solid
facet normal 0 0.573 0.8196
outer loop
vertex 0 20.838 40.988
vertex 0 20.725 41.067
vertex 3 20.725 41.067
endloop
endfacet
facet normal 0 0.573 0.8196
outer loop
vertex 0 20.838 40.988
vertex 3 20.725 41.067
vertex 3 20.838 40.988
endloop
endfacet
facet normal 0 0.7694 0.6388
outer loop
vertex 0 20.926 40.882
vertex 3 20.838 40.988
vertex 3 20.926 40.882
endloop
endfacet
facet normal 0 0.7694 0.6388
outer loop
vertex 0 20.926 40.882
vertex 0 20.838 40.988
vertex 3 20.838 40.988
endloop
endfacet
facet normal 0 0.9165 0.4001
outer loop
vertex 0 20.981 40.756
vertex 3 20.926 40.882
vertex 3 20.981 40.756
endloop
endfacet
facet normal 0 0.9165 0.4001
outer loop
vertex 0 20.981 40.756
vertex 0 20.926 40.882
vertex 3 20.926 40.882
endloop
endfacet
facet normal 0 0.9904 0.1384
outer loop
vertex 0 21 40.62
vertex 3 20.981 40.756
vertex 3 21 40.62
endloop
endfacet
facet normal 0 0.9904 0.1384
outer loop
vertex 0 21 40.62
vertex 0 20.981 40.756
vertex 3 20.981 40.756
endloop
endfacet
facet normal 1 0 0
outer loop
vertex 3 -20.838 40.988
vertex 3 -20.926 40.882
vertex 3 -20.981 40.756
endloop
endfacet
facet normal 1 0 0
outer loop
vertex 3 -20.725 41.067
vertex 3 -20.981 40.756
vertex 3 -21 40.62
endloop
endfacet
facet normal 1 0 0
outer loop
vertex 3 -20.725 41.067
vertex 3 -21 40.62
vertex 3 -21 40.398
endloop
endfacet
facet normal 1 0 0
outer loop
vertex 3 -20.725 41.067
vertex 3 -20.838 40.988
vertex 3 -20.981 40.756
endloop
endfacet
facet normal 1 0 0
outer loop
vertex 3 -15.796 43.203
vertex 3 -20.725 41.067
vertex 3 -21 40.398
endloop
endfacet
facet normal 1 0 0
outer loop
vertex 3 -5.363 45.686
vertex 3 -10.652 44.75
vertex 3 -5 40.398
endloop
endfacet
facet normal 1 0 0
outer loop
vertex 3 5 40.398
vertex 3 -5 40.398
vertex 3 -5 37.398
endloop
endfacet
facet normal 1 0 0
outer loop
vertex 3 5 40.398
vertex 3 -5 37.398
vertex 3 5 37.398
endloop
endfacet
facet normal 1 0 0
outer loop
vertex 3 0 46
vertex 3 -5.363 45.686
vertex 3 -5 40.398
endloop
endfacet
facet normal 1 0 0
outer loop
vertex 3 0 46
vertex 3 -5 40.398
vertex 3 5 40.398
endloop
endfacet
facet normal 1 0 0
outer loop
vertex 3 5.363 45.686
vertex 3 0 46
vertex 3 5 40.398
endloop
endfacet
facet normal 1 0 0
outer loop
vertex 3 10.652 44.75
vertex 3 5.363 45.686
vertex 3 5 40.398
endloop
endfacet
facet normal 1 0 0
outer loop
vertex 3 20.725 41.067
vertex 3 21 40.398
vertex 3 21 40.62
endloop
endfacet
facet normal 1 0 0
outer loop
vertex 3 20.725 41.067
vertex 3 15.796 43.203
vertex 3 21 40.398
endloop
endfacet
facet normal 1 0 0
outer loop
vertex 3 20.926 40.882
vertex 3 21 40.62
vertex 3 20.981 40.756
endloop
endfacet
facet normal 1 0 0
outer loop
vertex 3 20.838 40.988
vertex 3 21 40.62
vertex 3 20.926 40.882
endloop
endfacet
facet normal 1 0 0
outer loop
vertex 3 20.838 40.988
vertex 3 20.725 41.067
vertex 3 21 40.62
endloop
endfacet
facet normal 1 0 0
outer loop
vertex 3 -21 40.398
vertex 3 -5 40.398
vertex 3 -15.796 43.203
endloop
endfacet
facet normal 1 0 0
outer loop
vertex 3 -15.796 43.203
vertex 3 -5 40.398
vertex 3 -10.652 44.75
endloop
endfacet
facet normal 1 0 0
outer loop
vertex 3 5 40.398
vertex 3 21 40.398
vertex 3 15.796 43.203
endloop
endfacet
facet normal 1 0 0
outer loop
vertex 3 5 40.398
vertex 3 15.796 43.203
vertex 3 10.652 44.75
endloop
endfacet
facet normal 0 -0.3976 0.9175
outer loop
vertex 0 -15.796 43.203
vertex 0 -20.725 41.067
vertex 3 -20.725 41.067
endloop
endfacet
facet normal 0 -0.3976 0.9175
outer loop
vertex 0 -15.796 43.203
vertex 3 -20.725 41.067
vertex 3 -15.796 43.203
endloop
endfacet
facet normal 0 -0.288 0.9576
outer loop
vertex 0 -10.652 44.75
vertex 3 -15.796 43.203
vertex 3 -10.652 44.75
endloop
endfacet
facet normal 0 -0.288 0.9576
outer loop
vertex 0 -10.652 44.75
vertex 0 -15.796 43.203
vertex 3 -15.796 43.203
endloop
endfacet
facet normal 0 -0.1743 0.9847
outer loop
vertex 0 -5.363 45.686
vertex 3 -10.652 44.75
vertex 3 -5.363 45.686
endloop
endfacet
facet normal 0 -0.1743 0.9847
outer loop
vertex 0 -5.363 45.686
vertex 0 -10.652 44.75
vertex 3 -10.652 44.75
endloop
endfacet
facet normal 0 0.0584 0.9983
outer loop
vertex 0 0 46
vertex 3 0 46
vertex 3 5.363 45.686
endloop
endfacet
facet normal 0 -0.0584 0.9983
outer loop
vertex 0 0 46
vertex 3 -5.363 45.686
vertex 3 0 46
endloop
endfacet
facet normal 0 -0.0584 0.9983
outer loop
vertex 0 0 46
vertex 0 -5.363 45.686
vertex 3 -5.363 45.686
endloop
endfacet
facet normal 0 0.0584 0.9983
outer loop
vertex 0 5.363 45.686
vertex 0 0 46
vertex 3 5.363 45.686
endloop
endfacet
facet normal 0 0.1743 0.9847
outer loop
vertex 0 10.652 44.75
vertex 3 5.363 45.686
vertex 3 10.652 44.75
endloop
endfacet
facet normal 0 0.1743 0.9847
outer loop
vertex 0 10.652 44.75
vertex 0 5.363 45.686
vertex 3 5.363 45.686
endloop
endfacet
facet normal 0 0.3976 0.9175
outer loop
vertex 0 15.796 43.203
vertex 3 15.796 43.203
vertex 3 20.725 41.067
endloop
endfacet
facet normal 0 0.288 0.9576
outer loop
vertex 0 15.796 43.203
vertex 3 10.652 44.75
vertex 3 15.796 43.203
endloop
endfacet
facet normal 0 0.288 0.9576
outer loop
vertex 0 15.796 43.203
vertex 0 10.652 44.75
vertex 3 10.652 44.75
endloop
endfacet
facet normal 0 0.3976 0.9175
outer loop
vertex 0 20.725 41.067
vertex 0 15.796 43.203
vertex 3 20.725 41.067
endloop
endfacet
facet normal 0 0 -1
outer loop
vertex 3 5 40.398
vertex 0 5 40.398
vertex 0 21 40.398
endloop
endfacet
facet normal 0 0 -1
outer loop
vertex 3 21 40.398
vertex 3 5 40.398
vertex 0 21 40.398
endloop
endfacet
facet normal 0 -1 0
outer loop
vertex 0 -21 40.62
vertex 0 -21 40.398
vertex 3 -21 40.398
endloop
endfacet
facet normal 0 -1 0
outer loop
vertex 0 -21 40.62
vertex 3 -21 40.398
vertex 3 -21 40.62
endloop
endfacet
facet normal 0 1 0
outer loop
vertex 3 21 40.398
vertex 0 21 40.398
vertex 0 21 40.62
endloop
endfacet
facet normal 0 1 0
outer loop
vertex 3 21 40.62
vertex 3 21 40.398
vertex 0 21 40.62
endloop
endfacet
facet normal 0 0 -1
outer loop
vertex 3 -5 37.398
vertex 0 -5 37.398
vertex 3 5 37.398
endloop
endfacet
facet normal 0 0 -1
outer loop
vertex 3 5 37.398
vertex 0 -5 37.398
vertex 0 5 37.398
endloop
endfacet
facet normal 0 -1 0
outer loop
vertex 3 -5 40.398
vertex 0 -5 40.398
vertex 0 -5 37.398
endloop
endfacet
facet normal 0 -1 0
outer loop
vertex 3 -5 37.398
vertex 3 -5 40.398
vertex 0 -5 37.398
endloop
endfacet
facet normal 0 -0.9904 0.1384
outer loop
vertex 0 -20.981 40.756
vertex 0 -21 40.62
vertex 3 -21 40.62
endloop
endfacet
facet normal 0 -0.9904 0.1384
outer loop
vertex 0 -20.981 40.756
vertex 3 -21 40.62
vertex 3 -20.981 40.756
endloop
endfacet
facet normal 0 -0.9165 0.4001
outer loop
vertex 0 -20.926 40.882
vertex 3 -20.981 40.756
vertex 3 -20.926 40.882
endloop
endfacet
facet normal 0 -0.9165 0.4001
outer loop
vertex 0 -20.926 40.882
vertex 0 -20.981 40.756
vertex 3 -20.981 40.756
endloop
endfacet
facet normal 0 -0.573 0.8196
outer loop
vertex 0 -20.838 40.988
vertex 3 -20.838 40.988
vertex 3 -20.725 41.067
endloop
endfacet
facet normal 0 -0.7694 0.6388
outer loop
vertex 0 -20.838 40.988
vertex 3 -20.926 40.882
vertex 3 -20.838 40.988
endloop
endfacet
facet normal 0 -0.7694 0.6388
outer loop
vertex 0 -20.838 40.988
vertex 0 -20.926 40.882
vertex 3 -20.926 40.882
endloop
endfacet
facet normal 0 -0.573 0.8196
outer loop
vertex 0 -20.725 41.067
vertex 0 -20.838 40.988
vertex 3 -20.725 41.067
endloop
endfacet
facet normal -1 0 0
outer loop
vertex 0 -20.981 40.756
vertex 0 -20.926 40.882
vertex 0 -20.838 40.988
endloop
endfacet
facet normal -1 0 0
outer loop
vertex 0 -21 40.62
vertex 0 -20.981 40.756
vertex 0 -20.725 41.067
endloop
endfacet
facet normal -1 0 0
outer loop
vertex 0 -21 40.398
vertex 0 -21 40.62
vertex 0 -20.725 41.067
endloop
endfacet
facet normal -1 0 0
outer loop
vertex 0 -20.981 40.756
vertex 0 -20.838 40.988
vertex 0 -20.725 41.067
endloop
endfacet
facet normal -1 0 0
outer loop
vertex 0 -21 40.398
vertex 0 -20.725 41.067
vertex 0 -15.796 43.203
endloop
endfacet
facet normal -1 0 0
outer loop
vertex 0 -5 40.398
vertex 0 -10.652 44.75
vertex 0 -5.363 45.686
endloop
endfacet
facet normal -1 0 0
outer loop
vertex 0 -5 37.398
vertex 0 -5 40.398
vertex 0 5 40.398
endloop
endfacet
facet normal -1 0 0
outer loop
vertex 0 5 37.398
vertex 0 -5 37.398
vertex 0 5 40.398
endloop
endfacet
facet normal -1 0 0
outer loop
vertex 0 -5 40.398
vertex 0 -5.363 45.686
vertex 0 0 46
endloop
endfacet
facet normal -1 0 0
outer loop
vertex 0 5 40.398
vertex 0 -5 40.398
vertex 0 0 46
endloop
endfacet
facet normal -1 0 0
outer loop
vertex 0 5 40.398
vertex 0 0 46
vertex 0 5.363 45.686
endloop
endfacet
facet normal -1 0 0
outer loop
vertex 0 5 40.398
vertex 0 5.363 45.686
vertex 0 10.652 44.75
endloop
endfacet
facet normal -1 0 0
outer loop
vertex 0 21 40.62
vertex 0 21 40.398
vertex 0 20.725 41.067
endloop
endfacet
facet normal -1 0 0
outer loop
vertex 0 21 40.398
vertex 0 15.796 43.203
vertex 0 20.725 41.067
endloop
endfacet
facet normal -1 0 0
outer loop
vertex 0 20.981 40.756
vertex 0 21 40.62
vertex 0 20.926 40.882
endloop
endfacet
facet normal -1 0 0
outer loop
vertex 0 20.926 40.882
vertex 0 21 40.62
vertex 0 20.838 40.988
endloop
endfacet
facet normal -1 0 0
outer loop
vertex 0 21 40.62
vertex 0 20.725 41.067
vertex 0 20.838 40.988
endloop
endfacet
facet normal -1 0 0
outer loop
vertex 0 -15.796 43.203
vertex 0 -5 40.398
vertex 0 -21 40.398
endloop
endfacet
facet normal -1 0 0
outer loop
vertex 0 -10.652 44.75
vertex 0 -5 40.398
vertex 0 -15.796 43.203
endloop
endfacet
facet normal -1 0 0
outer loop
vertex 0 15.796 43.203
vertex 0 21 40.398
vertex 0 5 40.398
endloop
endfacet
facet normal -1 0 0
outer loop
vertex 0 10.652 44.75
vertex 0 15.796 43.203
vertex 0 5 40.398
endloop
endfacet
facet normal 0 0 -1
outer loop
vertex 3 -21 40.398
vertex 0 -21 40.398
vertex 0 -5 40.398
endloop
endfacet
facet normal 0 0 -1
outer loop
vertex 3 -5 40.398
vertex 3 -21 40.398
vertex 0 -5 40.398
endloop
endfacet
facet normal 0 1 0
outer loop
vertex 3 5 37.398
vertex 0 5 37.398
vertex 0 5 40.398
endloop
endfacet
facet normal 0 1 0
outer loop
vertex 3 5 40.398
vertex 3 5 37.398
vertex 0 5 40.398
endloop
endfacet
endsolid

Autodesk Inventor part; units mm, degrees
ref_plane "YZ Plane" through (0, 0, 0) normal (1, 0, 0) x (0, 1, 0)
ref_plane "XZ Plane" through (0, 0, 0) normal (0, 1, 0) x (-1, 0, 0)
ref_plane "XY Plane" through (0, 0, 0) normal (0, 0, 1) x (1, 0, 0)
sketch "Sketch1" plane through (0, 0, 0) normal (1, 0, 0) x (0, 1, 0)
  line L0 (-5, 40.398) -> (-5, 37.398)
  line L1 (-5, 37.398) -> (5, 37.398)
  line L2 (5, 37.398) -> (5, 40.398)
  line L3 (-21, 40.398) -> (-5, 40.398)
  line L4 (5, 40.398) -> (21, 40.398)
  line L5 (-21, 40.398) -> (-21, 40.6202)
  line L6 (21, 40.398) -> (21, 40.6202)
  arc A0 (-20.7253, 41.0666) -> (-21, 40.6202) centre (-20.5, 40.6202) ccw
  arc A1 (21, 40.6202) -> (20.7253, 41.0666) centre (20.5, 40.6202) ccw
  arc A2 (20.7253, 41.0666) -> (-20.7253, 41.0666) centre (0, 0) ccw
  point P0 (0, 37.398)
  dimension "d3" = 10
  dimension "d6" = 3
  dimension "d7" = 42
  dimension "d8" = 16
  dimension "d9" = 0.5
  dimension "d10" = 37.398
extrude "Extrusion1" add sketch "Sketch1" along normal blind 3
properties part number "Camera Blinder 25090213"
